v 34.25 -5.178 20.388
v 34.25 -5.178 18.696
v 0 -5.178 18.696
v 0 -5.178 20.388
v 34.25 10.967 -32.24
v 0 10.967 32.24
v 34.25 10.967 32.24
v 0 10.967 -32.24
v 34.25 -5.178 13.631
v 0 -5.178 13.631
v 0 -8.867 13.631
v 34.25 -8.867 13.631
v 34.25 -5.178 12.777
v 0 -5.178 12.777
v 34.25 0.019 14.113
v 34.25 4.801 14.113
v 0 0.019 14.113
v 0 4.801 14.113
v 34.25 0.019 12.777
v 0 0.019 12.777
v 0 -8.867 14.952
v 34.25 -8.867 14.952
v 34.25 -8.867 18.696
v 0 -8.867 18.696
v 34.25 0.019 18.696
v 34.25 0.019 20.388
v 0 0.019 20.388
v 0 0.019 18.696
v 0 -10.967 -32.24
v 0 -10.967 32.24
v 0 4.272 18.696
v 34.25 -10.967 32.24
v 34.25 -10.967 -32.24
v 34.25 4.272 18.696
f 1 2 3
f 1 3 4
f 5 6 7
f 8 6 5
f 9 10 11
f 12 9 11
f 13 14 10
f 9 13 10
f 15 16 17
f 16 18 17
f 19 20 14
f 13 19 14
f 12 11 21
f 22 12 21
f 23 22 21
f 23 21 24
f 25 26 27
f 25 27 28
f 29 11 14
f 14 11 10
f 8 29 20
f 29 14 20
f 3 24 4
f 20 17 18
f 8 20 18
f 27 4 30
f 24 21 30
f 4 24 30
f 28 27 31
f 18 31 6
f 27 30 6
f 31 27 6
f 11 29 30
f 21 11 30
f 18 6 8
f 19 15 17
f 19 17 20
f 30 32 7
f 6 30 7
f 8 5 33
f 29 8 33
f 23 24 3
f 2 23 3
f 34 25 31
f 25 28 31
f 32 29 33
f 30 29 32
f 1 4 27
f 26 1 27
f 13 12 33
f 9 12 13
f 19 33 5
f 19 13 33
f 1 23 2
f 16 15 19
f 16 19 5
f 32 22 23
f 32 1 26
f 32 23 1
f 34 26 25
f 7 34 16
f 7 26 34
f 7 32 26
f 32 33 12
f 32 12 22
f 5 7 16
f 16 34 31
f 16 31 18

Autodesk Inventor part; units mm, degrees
ref_plane "YZ Plane" through (0, 0, 0) normal (1, 0, 0) x (0, 1, 0)
ref_plane "XZ Plane" through (0, 0, 0) normal (0, 1, 0) x (-1, 0, 0)
ref_plane "XY Plane" through (0, 0, 0) normal (0, 0, 1) x (1, 0, 0)
sketch "Sketch1" plane through (0, 0, 0) normal (1, 0, 0) x (0, 1, 0)
  line L0 (10.9667, -32.2396) -> (-10.9667, -32.2396)
  line L1 (-10.9667, -32.2396) -> (-10.9667, 32.2396)
  line L2 (-10.9667, 32.2396) -> (10.9667, 32.2396)
  line L3 (10.9667, 32.2396) -> (10.9667, -32.2396)
  line L4 (10.9667, -32.2396) -> (-10.9667, 32.2396) construction
  line L5 (-10.9667, -32.2396) -> (10.9667, 32.2396) construction
  line L6 (-8.867, 14.9521) -> (-8.867, 18.6958)
  line L7 (-8.867, 18.6958) -> (-5.1781, 18.6958)
  line L8 (-5.1781, 18.6958) -> (-5.1781, 20.3884)
  line L9 (-5.1781, 20.3884) -> (0.0187, 20.3884)
  line L10 (0.0187, 20.3884) -> (0.0187, 18.6958)
  line L11 (0.0187, 18.6958) -> (4.2724, 18.6958)
  line L12 (4.2724, 18.6958) -> (4.8008, 14.1133)
  line L13 (4.8008, 14.1133) -> (0.0187, 14.1133)
  line L14 (0.0187, 14.1133) -> (0.0187, 12.7771)
  line L15 (0.0187, 12.7771) -> (-5.1781, 12.7771)
  line L16 (-5.1781, 12.7771) -> (-5.1781, 13.6309)
  line L17 (-5.1781, 13.6309) -> (-8.867, 13.6309)
  line L18 (-8.867, 13.6309) -> (-8.867, 14.9521)
  point P0 (0, 0)
extrude "Extrusion1" add sketch "Sketch1" along normal blind 34.25
properties part number "test blok"
